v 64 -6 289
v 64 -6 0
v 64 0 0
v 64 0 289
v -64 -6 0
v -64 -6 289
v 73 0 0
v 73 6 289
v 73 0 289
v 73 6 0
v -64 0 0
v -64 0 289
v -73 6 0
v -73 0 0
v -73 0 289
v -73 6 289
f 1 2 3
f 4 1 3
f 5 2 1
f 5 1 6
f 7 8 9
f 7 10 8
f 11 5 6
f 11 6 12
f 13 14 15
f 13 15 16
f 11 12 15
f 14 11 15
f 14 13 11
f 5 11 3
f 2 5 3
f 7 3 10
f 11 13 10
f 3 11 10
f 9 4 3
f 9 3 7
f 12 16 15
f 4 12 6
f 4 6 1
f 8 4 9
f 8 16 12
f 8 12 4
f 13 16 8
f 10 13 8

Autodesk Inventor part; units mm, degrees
ref_plane "YZ Plane" through (0, 0, 0) normal (1, 0, 0) x (0, 1, 0)
ref_plane "XZ Plane" through (0, 0, 0) normal (0, 1, 0) x (-1, 0, 0)
ref_plane "XY Plane" through (0, 0, 0) normal (0, 0, 1) x (1, 0, 0)
sketch "Skizze1" plane through (0, 0, 0) normal (0, 0, 1) x (1, 0, 0)
  line L0 (73, -6) -> (-73, -6)
  line L1 (-73, -6) -> (-73, 6)
  line L2 (-73, 6) -> (73, 6)
  line L3 (73, 6) -> (73, -6)
  line L4 (73, -6) -> (-73, 6) construction
  line L5 (-73, -6) -> (73, 6) construction
  point P0 (0, 0)
  dimension "d0" = 146
  dimension "d1" = 12
extrude "Extrusion1" add sketch "Skizze1" along normal blind 289
sketch "Skizze2" plane through (0, 0, 0) normal (0, 0, -1) x (-1, 0, 0)
  line L0 (-73, -6) -> (-64, -6)
  line L1 (-64, -6) -> (-64, 0)
  line L2 (-64, 0) -> (-73, 0)
  line L3 (-73, 0) -> (-73, -6)
  line L4 (73, -6) -> (64, -6)
  line L5 (64, -6) -> (64, 0)
  line L6 (64, 0) -> (73, 0)
  line L7 (73, 0) -> (73, -6)
  point P0 (0, 0)
  dimension "d4" = 6
  dimension "d5" = 128
  dimension "d6" = 64
extrude "Extrusion2" cut sketch "Skizze2" against normal through all
equation "\"d6\" = 0.5 * d5"
properties part number "Lid_MaintenanceCover" material "Polycarbonat, klar"
